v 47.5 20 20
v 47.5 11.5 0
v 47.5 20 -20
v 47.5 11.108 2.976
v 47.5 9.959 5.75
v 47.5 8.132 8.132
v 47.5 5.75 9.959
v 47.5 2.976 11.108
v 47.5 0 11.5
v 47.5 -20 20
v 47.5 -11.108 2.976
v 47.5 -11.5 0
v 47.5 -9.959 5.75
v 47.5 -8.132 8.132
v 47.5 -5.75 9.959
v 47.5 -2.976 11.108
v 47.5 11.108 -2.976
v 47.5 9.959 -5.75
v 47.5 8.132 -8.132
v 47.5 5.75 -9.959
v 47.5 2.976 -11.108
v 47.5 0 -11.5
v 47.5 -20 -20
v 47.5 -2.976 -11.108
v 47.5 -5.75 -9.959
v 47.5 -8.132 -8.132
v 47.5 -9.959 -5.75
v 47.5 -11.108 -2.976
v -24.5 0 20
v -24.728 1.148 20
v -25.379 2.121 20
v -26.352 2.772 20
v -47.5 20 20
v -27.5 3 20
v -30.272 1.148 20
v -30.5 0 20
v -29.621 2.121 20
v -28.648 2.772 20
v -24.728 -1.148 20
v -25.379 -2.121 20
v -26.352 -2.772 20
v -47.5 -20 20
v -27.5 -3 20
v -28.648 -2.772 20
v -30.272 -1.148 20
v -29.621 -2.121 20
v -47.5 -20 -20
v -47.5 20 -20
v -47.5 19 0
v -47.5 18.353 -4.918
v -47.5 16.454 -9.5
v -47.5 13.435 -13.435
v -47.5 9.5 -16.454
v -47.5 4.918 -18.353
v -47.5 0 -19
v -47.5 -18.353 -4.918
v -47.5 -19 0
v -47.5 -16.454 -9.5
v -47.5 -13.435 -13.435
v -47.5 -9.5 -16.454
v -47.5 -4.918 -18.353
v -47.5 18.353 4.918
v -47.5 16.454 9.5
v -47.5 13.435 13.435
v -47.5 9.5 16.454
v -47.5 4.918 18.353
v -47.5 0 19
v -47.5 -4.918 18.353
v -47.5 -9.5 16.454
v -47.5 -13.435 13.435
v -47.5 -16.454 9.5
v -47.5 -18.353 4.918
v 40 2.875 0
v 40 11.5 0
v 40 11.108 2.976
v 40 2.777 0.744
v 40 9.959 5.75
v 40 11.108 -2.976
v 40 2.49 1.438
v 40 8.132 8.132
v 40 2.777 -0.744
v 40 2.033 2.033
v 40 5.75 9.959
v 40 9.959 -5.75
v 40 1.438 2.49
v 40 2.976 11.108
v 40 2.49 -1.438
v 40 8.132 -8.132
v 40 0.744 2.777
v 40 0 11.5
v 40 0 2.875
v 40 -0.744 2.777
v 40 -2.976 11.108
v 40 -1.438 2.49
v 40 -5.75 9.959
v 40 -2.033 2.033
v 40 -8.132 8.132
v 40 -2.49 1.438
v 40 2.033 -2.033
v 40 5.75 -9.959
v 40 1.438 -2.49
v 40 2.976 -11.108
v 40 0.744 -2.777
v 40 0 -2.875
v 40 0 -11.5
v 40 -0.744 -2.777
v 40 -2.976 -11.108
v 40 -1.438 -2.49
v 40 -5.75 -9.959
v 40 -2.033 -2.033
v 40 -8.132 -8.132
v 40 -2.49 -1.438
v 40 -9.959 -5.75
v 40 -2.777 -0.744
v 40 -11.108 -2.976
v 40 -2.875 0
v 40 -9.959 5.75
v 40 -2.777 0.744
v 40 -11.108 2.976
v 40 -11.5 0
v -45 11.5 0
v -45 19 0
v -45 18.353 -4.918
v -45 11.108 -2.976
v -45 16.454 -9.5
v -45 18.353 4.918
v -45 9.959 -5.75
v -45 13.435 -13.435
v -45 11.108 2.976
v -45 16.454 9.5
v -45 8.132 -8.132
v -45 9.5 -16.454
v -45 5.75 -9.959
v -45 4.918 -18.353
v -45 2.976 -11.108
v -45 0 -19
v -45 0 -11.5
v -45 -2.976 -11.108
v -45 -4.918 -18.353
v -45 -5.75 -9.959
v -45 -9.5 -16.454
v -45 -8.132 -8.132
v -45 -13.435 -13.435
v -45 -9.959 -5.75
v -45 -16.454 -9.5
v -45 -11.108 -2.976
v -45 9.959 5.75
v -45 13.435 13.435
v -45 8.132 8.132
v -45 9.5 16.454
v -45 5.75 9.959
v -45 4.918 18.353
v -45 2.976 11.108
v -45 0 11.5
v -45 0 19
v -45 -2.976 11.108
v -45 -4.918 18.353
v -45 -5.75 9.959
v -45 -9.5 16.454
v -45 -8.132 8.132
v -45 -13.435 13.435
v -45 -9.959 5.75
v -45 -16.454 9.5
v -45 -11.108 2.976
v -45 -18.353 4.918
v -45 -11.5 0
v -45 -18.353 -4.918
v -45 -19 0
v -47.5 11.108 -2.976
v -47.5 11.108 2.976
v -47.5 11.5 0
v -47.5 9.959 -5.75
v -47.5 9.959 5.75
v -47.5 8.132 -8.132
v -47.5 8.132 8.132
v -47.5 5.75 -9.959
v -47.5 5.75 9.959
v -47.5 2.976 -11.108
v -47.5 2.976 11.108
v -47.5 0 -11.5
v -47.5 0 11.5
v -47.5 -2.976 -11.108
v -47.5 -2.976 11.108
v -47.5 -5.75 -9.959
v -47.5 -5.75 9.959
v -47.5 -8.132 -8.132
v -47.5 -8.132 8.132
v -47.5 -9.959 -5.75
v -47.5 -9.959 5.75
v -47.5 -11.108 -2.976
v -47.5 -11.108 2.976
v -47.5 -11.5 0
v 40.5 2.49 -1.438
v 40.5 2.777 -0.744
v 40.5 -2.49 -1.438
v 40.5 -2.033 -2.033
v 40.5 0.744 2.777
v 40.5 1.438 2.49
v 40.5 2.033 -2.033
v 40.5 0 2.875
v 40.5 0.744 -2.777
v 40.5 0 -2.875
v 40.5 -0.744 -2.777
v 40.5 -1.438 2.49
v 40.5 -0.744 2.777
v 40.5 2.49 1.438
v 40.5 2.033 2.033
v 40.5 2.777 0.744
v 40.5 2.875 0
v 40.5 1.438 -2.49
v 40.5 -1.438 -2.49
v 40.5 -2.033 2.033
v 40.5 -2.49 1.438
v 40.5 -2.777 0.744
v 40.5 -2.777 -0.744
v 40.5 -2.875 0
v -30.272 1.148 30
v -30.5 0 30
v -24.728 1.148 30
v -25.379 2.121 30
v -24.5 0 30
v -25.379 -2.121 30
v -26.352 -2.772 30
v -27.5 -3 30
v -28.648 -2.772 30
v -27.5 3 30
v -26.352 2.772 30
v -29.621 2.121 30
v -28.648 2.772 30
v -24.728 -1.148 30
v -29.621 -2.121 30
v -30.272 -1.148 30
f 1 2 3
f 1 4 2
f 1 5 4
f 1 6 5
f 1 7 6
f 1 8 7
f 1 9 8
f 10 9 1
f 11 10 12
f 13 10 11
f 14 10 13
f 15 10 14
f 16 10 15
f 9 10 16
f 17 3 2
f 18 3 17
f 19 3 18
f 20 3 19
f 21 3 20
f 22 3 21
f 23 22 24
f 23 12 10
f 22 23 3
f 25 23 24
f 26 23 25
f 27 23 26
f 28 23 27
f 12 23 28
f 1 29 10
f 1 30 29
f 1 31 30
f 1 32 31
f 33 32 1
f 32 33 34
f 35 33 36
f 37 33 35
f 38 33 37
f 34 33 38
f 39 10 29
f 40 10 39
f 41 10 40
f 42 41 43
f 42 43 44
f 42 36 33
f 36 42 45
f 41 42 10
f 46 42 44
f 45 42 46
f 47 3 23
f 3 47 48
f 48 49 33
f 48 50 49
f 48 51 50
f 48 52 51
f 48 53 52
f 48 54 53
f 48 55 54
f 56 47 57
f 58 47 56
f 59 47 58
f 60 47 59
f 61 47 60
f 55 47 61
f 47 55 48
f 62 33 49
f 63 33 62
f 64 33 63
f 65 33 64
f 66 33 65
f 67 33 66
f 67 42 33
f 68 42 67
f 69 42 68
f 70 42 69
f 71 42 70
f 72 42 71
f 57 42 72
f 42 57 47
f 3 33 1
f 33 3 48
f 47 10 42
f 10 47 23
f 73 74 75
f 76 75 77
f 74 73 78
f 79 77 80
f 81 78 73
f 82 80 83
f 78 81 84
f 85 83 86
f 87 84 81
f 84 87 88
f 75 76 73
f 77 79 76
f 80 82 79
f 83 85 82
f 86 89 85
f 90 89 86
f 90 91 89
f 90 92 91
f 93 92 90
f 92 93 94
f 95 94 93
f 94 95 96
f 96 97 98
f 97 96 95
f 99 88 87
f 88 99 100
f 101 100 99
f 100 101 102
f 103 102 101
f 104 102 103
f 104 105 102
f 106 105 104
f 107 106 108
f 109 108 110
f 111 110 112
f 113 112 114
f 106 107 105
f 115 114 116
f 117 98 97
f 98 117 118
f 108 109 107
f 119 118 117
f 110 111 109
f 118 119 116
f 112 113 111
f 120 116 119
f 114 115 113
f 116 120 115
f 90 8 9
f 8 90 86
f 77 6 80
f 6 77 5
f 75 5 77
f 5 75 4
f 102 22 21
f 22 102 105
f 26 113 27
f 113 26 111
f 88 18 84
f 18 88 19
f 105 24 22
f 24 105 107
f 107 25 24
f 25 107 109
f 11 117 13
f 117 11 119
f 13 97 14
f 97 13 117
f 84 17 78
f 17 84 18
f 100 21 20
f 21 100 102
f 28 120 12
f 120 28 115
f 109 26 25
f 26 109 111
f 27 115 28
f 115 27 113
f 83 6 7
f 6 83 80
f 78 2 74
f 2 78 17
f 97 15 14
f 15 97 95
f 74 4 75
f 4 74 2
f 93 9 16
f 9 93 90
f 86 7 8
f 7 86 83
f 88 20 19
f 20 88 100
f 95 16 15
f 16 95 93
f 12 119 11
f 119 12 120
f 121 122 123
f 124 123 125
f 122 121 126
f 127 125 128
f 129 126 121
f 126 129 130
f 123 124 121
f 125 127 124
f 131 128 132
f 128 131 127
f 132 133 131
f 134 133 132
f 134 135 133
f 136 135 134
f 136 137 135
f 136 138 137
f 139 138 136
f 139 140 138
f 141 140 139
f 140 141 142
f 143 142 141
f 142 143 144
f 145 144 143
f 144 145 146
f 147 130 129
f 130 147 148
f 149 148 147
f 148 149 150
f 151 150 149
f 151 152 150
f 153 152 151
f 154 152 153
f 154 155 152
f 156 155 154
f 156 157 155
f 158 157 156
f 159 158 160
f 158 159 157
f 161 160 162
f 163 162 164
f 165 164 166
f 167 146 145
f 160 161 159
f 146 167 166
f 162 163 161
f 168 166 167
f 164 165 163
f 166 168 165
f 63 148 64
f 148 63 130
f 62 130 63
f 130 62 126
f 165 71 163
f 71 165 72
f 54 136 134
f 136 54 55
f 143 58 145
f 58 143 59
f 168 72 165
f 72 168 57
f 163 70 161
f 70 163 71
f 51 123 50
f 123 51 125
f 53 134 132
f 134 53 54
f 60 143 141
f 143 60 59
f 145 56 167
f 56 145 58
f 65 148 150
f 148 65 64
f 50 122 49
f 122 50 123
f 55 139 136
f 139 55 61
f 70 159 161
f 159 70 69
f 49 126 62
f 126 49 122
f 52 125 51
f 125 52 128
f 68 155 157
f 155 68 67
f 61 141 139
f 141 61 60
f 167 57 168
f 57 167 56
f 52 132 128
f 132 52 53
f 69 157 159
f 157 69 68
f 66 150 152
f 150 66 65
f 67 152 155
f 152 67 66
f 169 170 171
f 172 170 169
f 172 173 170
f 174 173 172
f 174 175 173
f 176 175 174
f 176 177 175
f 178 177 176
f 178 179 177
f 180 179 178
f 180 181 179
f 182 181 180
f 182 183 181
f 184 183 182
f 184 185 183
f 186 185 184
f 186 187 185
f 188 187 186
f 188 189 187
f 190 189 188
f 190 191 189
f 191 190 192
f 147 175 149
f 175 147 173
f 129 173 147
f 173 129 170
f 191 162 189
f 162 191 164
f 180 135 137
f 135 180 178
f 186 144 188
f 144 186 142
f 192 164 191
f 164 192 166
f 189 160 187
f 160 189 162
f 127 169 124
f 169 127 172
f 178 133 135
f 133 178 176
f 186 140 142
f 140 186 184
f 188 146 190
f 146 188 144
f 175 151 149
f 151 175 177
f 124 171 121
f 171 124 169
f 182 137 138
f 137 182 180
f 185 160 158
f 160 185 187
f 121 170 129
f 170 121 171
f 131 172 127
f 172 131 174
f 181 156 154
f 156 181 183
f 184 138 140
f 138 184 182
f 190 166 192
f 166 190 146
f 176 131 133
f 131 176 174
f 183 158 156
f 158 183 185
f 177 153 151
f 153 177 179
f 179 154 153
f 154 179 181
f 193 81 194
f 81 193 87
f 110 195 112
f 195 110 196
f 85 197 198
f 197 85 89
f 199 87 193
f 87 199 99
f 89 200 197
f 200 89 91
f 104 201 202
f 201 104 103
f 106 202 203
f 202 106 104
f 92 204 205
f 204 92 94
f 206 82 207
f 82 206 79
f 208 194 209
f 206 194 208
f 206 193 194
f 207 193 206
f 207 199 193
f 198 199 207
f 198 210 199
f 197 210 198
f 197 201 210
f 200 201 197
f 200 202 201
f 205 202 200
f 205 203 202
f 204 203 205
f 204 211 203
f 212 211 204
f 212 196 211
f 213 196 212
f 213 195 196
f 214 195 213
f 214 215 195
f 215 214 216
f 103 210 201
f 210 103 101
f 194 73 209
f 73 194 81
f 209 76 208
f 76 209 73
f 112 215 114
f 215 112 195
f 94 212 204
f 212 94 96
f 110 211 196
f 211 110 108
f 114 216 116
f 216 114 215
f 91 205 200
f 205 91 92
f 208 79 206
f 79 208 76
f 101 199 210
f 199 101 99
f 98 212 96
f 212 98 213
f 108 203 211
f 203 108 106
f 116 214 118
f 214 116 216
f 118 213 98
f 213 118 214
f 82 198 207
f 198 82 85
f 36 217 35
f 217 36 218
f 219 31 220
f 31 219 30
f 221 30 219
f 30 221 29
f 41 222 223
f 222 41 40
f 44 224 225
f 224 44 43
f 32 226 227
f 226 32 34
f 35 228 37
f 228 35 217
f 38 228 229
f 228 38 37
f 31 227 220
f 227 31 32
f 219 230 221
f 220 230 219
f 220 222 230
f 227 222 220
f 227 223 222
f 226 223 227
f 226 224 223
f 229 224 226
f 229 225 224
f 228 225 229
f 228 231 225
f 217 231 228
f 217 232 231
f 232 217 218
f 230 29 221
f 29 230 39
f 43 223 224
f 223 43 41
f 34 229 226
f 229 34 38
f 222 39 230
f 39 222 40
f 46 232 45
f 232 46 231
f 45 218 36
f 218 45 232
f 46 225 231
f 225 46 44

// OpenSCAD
module laserEmitter(){
	difference(){
		//mainFrame
		color ([0.2,0.2,0.2]) cube(size=[95,40,40],center=true);
		//laserOpening
		translate([45,0,0]){
			rotate([0,90,0]){
				color([0.2,0.4,0.2]) cylinder(r=11.5,h=10,$fn=24,center=true);
			}
		}
		//fanCutout
		translate([-50,0,0]){
			rotate([0,90,0]){
				color([0.3,0.3,0.3]) cylinder(r=19,h=10,$fn=24,center=true);
			}
		}
	}
	//fanCenter
	translate([-45,0,0]){
		rotate([0,90,0]){
			color([0.2,0.2,0.2]) cylinder(r=11.5,h=5,$fn=24,center=true);
		}
	}
	//lens
	translate([38,0,0]){
		rotate([0,90,0]){
			color([0,1,0]) cylinder(r=2.875,h=5,$fn=24,center=true);
		}
	}
	//powerCable
	translate([-27.5,0,20]){
		rotate([0,0,0]){
			color ([0.2,0.2,0.2]) cylinder(r=3,h=20,$fn=16,center=true);
		}
	}
}

laserEmitter();
